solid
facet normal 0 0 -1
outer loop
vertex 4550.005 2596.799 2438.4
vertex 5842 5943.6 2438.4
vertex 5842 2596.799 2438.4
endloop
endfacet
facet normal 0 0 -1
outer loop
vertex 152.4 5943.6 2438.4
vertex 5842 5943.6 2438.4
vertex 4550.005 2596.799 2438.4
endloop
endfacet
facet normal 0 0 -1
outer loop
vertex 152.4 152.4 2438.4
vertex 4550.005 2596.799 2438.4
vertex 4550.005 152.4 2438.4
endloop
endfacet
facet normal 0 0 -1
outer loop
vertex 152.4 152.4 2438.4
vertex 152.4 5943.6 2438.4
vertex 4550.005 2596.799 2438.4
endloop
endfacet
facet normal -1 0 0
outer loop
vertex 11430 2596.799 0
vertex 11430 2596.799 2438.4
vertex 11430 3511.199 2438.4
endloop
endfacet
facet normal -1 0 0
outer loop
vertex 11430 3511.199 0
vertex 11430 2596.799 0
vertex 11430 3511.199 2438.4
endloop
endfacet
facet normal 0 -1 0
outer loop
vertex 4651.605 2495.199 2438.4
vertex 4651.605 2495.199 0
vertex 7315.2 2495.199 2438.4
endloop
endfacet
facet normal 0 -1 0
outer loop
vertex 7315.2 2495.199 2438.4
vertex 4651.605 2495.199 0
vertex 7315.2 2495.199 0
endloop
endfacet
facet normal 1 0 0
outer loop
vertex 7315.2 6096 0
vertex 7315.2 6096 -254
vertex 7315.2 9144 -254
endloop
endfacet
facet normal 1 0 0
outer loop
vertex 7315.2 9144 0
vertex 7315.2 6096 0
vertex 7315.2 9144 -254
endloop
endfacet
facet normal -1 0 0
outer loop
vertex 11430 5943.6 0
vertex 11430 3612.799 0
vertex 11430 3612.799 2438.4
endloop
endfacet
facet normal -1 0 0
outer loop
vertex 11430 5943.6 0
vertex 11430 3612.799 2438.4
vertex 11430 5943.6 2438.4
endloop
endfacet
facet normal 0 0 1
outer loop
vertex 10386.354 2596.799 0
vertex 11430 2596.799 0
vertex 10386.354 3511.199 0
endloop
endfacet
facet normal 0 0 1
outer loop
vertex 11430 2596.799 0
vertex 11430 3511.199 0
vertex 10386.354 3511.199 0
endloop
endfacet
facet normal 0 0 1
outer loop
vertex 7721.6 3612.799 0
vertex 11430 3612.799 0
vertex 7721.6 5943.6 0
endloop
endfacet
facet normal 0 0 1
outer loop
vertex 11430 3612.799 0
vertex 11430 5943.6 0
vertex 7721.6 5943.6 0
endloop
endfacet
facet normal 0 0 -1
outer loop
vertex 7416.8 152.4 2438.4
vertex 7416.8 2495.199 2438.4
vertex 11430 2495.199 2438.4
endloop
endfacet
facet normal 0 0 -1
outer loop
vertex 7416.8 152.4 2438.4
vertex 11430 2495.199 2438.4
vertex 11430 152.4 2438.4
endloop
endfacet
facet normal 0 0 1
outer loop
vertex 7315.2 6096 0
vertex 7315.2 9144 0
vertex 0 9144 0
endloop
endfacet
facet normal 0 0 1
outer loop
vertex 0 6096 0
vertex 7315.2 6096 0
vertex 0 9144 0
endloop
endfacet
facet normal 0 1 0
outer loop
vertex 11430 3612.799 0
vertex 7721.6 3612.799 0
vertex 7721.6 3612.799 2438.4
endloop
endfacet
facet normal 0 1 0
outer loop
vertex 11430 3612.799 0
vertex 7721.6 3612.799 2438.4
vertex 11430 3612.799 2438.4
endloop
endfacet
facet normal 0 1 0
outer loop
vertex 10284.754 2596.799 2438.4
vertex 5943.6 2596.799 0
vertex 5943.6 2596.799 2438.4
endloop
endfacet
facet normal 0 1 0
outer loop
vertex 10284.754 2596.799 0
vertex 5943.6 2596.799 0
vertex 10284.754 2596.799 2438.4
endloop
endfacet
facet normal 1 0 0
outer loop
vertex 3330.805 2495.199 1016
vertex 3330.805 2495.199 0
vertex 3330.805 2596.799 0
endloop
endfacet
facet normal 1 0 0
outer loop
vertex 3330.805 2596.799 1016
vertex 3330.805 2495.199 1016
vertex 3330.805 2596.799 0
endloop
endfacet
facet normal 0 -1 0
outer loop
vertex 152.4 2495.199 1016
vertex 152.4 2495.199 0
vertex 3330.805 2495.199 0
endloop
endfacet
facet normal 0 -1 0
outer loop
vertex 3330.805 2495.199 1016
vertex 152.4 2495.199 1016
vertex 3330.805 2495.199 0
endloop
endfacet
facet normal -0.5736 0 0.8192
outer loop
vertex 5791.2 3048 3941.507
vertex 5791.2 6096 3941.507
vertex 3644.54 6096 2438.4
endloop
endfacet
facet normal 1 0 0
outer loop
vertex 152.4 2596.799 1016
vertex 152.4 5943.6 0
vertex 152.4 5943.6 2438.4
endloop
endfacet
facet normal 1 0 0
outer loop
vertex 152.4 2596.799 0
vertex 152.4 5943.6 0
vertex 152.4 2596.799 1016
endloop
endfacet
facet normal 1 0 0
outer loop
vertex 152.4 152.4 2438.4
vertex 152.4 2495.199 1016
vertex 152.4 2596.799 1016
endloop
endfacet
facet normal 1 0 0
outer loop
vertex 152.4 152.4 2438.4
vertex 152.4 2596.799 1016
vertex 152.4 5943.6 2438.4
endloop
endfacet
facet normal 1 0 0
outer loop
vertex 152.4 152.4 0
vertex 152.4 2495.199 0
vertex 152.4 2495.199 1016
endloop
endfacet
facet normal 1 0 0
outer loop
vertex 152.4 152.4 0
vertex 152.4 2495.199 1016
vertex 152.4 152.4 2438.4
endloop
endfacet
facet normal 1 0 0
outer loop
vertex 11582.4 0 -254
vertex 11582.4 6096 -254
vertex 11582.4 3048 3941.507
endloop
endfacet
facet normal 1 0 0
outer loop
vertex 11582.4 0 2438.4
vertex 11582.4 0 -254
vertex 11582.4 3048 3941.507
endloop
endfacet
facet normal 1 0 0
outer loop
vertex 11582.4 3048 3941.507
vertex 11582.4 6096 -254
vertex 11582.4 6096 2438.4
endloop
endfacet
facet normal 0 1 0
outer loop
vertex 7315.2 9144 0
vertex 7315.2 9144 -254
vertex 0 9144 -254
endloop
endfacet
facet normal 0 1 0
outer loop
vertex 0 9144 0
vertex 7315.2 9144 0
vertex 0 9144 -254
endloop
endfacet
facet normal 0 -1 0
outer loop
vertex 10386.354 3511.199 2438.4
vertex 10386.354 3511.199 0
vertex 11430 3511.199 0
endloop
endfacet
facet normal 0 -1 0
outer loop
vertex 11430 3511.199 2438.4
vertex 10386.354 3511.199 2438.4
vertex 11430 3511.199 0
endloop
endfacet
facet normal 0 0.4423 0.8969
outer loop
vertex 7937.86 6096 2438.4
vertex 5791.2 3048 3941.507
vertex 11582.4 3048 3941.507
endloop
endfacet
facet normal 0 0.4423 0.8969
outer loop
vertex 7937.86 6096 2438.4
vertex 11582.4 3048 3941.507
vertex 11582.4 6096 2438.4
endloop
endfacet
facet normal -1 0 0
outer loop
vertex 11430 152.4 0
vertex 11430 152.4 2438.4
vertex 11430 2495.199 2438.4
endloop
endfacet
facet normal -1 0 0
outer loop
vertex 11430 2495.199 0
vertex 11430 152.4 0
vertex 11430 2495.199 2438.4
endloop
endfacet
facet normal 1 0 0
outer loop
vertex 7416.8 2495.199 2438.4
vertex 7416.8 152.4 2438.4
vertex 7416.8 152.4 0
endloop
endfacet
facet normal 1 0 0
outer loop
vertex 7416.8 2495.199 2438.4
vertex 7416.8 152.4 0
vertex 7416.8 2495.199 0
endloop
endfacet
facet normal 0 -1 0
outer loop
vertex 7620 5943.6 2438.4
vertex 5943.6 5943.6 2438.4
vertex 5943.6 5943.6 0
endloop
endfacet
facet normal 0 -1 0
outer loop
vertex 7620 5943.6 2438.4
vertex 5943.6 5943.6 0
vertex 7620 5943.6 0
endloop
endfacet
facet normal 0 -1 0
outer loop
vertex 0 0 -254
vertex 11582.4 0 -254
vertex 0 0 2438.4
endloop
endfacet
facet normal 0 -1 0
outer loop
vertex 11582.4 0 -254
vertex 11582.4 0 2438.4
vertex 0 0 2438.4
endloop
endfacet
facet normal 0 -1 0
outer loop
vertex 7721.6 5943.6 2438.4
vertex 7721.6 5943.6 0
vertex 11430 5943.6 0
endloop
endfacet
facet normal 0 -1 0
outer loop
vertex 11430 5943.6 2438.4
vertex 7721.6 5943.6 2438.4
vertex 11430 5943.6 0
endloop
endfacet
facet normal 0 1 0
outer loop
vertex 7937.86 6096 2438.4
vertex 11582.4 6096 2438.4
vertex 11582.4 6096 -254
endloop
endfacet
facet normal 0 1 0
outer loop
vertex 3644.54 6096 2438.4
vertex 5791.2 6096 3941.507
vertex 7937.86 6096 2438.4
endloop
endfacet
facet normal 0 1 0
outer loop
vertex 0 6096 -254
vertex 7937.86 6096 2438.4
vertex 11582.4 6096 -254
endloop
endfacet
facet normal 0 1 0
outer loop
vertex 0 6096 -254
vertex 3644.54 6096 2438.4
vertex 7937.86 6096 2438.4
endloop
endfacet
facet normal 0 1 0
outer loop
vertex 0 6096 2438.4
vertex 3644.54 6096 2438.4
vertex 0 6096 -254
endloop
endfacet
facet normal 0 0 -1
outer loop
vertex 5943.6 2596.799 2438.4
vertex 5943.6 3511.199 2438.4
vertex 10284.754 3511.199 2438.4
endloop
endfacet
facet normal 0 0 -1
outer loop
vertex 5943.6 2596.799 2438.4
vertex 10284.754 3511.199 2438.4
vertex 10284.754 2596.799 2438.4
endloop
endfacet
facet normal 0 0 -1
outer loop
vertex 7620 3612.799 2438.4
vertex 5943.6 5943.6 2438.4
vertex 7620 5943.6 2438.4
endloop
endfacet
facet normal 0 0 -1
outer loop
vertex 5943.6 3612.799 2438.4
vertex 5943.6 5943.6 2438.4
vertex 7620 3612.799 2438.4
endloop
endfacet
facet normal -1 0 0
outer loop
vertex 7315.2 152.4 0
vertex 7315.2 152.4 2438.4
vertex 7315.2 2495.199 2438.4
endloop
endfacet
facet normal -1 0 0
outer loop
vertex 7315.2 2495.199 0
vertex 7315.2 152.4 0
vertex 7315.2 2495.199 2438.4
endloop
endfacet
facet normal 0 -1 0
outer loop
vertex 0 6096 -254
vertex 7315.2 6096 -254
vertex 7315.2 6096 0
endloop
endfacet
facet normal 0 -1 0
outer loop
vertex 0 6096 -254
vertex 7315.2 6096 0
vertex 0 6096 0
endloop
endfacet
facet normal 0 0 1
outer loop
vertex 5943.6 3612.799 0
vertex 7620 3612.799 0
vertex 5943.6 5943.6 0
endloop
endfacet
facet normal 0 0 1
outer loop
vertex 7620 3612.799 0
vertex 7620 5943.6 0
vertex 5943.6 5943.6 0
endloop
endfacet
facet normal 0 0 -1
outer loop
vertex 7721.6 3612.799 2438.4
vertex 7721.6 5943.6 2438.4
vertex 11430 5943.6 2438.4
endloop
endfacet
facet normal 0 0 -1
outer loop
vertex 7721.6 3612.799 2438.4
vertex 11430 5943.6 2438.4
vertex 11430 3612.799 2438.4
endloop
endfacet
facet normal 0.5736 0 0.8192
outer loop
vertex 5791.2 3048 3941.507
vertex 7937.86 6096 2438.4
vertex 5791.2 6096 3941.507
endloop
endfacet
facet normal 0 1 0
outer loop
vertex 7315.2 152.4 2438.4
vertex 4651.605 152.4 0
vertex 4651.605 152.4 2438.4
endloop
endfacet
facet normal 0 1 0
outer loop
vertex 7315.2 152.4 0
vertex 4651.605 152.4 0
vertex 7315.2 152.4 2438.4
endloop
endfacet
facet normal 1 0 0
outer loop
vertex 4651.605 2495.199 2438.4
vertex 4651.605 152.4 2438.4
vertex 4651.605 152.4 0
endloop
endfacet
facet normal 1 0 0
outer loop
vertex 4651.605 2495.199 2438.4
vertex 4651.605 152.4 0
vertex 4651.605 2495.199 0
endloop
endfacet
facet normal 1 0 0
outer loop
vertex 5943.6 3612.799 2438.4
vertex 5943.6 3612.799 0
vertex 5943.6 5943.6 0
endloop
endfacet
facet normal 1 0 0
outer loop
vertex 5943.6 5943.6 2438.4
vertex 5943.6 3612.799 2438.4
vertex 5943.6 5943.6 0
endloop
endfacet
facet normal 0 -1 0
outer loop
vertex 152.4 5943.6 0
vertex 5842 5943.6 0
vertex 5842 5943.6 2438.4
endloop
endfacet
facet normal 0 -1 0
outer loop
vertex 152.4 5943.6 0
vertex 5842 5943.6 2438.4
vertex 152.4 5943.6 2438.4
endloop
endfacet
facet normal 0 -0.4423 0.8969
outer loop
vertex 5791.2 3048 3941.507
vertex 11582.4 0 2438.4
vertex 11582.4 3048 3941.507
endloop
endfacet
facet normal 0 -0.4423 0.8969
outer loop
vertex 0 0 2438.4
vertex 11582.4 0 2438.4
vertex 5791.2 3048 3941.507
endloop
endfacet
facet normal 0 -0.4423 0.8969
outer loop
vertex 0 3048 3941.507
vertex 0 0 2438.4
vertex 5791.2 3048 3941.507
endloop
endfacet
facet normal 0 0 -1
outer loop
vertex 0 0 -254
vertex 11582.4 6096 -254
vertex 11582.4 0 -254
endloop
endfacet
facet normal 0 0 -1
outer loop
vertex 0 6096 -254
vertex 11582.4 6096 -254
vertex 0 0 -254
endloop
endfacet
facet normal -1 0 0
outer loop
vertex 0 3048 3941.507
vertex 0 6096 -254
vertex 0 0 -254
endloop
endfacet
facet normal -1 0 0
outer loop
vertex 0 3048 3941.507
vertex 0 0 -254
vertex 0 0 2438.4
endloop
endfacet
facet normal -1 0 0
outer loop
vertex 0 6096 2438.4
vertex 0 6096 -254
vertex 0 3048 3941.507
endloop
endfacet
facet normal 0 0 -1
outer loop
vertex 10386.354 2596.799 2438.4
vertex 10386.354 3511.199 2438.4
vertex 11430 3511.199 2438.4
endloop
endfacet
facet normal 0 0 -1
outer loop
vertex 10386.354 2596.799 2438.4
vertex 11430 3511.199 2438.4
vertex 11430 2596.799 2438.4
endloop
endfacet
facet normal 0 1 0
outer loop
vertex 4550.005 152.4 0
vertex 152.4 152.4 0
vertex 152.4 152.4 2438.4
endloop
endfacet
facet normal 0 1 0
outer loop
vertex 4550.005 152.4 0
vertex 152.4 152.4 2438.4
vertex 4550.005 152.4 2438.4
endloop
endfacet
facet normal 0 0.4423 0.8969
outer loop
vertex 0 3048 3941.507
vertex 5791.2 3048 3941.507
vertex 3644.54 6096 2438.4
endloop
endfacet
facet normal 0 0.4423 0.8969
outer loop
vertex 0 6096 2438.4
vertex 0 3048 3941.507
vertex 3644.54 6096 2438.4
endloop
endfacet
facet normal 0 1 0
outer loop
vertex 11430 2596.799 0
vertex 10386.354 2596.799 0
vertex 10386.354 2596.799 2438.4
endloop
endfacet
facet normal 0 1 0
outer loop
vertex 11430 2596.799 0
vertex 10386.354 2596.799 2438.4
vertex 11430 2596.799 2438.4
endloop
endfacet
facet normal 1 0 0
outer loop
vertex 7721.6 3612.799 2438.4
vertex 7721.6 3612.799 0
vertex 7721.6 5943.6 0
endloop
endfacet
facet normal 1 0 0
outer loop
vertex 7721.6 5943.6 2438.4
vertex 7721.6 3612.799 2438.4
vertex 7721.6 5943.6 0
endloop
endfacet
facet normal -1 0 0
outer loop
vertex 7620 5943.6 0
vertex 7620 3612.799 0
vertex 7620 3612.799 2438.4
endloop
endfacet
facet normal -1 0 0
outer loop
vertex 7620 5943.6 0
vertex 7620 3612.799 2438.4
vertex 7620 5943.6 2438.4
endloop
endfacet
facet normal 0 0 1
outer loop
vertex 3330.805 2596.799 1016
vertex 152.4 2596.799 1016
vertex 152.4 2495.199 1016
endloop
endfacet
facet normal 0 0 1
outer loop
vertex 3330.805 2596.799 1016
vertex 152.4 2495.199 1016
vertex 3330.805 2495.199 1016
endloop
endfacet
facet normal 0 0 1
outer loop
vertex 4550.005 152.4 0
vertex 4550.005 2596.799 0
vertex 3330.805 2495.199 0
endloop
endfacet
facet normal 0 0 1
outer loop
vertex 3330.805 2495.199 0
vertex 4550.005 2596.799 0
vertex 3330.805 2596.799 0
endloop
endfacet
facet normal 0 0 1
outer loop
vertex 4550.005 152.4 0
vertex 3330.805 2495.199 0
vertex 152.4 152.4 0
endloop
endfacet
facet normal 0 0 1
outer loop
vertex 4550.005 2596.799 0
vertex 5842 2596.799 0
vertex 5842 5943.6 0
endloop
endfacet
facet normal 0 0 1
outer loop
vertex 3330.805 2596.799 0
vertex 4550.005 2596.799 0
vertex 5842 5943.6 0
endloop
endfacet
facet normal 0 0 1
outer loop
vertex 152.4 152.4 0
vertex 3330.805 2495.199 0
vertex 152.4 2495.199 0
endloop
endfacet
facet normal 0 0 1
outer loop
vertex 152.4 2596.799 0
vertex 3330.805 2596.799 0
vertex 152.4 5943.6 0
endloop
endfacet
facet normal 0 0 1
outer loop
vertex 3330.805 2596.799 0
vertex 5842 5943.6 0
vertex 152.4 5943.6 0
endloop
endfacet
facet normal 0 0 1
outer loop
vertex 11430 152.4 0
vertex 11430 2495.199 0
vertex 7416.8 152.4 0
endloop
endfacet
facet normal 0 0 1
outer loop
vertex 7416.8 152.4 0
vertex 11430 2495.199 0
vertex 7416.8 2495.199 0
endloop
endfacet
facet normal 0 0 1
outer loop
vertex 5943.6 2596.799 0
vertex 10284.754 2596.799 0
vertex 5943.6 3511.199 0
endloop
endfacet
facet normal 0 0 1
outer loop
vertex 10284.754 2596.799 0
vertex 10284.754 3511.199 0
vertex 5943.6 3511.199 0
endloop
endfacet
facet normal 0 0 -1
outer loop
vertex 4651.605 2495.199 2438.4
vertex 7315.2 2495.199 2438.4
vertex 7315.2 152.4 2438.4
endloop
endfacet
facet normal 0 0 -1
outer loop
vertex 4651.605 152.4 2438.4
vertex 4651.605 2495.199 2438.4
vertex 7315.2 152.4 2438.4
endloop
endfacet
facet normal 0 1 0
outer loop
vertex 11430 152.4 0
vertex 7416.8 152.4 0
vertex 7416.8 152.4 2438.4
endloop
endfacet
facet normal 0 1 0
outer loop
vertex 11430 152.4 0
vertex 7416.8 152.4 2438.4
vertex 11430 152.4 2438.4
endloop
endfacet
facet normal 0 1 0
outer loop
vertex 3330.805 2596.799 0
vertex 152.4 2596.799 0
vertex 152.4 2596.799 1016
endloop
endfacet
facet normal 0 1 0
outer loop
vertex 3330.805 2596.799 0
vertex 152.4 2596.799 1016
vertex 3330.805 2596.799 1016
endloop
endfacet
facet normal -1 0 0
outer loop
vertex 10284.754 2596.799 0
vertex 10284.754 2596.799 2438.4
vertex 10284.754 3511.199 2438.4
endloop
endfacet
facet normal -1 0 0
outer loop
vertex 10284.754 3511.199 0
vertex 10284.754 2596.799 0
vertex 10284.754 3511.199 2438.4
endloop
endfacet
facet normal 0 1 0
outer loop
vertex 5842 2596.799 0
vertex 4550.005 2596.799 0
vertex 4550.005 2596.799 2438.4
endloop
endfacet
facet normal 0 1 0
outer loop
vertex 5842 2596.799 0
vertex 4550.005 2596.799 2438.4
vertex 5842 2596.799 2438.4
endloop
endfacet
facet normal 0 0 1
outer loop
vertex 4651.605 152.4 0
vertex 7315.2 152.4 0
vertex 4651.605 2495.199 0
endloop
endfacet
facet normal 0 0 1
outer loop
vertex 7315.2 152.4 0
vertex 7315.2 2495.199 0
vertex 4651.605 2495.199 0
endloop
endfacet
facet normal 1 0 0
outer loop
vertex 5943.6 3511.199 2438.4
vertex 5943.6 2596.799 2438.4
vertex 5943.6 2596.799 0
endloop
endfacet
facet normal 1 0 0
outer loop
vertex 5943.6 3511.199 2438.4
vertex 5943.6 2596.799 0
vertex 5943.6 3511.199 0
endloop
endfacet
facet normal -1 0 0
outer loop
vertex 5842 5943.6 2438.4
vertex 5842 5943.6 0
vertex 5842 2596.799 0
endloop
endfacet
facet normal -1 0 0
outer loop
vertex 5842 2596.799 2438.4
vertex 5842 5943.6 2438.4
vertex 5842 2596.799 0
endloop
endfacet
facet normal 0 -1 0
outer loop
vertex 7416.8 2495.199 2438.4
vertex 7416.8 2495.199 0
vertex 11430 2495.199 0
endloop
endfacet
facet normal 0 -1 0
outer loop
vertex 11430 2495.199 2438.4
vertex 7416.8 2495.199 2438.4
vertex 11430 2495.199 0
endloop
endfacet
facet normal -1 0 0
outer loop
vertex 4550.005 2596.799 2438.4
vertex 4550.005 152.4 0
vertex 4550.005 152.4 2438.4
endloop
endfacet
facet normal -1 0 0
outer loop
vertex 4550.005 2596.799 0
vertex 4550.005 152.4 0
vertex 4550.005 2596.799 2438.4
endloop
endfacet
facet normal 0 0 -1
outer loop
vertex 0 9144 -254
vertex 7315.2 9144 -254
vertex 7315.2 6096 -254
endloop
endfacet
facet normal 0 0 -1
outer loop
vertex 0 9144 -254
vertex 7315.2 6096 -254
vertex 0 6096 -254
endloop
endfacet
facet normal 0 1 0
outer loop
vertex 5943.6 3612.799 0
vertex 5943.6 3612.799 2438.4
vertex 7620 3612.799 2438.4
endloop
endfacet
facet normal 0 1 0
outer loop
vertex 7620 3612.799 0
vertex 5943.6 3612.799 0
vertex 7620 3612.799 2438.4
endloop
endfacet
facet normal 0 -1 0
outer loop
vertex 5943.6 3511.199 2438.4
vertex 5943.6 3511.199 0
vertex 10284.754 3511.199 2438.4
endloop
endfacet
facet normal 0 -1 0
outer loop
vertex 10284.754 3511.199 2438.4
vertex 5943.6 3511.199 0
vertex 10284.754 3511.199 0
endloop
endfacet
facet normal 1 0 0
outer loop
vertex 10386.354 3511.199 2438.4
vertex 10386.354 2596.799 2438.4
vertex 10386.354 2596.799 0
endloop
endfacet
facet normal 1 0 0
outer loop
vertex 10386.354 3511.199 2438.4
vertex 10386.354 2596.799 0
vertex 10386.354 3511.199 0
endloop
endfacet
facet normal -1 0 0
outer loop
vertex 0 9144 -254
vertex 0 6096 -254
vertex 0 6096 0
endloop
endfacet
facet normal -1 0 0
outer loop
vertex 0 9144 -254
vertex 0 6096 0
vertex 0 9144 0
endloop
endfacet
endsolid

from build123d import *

# Parameters (mm, degrees)
SKETCH3_W           = 11582.4
SKETCH3_H           = 6096
SKETCH3_W_2         = 4341.154286856
SKETCH3_H_2         = 914.4
SKETCH3_W_3         = 1676.4
SKETCH3_H_3         = 2330.801356814
SKETCH3_W_4         = 2663.595025017
SKETCH3_H_4         = 2342.798643186
SKETCH3_W_5         = 1043.645713144
SKETCH3_W_6         = 4013.2
SKETCH3_W_7         = 3708.4
BOSS_EXTRUDE1_DEPTH = 2438.4
SKETCH4_W           = 11582.4
SKETCH4_H           = 6096
BOSS_EXTRUDE2_DEPTH = 254
SKETCH5_W           = 3178.404974983
SKETCH5_H           = 101.6
BOSS_EXTRUDE3_DEPTH = 1016
BOSS_EXTRUDE4_DEPTH = 11582.4
BOSS_EXTRUDE5_REACH = 6098
SKETCH8_W           = 7315.2
SKETCH8_H           = 3048
BOSS_EXTRUDE6_DEPTH = 254


with BuildPart() as part:
    # Sketch3 → Boss-Extrude1 (new body)
    with BuildSketch(Plane.XY):
        with Locations((5791.2, 3048)):
            Rectangle(SKETCH3_W, SKETCH3_H)
        Polygon((152.4, 152.4), (4550.004974983, 152.4), (4550.004974983, 2596.798643186), (5842, 2596.798643186), (5842, 3511.198643186), (5842, 5943.6), (152.4, 5943.6), align=None, mode=Mode.SUBTRACT)
        with Locations((8114.177143428, 3053.998643186)):
            Rectangle(SKETCH3_W_2, SKETCH3_H_2, mode=Mode.SUBTRACT)
        with Locations((6781.8, 4778.199321593)):
            Rectangle(SKETCH3_W_3, SKETCH3_H_3, mode=Mode.SUBTRACT)
        with Locations((5983.402487492, 1323.799321593)):
            Rectangle(SKETCH3_W_4, SKETCH3_H_4, mode=Mode.SUBTRACT)
        with Locations((10908.177143428, 3053.998643186)):
            Rectangle(SKETCH3_W_5, SKETCH3_H_2, mode=Mode.SUBTRACT)
        with Locations((9423.4, 1323.799321593)):
            Rectangle(SKETCH3_W_6, SKETCH3_H_4, mode=Mode.SUBTRACT)
        with Locations((9575.8, 4778.199321593)):
            Rectangle(SKETCH3_W_7, SKETCH3_H_3, mode=Mode.SUBTRACT)
    extrude(amount=BOSS_EXTRUDE1_DEPTH)

    # Sketch4 → Boss-Extrude2 (add)
    with BuildSketch(Plane(origin=(0, 0, 0), x_dir=(-1, 0, 0), z_dir=(0, 0, -1))):
        with Locations((-5791.2, 3048)):
            Rectangle(SKETCH4_W, SKETCH4_H)
    extrude(amount=BOSS_EXTRUDE2_DEPTH)

    # Sketch5 → Boss-Extrude3 (add)
    with BuildSketch(Plane.XY):
        with Locations((1741.602487492, 2545.998643186)):
            Rectangle(SKETCH5_W, SKETCH5_H)
    extrude(amount=BOSS_EXTRUDE3_DEPTH)

    # Sketch6 → Boss-Extrude4 (add)
    with BuildSketch(Plane.ZY):
        Polygon((2438.4, 6096), (2438.4, 0), (3941.507258543, 3048), align=None)
    extrude(amount=-BOSS_EXTRUDE4_DEPTH)

    # Boss-Extrude5: up to this face of the body (flat: up to its plane)
    boss_extrude5_end = Plane(part.part.faces().sort_by_distance((5791.2, 4572, 3189.953629272))[0])
    # Sketch7 → Boss-Extrude5 (add, up to the picked face)
    with BuildSketch(Plane(origin=(0, 6096, 0), x_dir=(1, 0, 0), z_dir=(0, 1, 0)), mode=Mode.PRIVATE) as boss_extrude5_sk1:
        Polygon((7937.859635208, -2438.4), (5791.2, -3941.507258543), (3644.540364792, -2438.4), align=None)
    boss_extrude5_tool1 = split(extrude(boss_extrude5_sk1.sketch, amount=-BOSS_EXTRUDE5_REACH, mode=Mode.PRIVATE), bisect_by=boss_extrude5_end, keep=Keep.BOTH, mode=Mode.PRIVATE)
    add(boss_extrude5_tool1.solids().sort_by_distance((5791.2, 6096, 2939.435753))[0])


with BuildPart() as body_2:
    # Sketch8 → Boss-Extrude6 (new body)
    with BuildSketch(Plane(origin=(0, 0, -254), x_dir=(-1, 0, 0), z_dir=(0, 0, -1))):
        with Locations((-3657.6, 7620)):
            Rectangle(SKETCH8_W, SKETCH8_H)
    extrude(amount=-BOSS_EXTRUDE6_DEPTH)


solid = Compound([part.part, body_2.part])
